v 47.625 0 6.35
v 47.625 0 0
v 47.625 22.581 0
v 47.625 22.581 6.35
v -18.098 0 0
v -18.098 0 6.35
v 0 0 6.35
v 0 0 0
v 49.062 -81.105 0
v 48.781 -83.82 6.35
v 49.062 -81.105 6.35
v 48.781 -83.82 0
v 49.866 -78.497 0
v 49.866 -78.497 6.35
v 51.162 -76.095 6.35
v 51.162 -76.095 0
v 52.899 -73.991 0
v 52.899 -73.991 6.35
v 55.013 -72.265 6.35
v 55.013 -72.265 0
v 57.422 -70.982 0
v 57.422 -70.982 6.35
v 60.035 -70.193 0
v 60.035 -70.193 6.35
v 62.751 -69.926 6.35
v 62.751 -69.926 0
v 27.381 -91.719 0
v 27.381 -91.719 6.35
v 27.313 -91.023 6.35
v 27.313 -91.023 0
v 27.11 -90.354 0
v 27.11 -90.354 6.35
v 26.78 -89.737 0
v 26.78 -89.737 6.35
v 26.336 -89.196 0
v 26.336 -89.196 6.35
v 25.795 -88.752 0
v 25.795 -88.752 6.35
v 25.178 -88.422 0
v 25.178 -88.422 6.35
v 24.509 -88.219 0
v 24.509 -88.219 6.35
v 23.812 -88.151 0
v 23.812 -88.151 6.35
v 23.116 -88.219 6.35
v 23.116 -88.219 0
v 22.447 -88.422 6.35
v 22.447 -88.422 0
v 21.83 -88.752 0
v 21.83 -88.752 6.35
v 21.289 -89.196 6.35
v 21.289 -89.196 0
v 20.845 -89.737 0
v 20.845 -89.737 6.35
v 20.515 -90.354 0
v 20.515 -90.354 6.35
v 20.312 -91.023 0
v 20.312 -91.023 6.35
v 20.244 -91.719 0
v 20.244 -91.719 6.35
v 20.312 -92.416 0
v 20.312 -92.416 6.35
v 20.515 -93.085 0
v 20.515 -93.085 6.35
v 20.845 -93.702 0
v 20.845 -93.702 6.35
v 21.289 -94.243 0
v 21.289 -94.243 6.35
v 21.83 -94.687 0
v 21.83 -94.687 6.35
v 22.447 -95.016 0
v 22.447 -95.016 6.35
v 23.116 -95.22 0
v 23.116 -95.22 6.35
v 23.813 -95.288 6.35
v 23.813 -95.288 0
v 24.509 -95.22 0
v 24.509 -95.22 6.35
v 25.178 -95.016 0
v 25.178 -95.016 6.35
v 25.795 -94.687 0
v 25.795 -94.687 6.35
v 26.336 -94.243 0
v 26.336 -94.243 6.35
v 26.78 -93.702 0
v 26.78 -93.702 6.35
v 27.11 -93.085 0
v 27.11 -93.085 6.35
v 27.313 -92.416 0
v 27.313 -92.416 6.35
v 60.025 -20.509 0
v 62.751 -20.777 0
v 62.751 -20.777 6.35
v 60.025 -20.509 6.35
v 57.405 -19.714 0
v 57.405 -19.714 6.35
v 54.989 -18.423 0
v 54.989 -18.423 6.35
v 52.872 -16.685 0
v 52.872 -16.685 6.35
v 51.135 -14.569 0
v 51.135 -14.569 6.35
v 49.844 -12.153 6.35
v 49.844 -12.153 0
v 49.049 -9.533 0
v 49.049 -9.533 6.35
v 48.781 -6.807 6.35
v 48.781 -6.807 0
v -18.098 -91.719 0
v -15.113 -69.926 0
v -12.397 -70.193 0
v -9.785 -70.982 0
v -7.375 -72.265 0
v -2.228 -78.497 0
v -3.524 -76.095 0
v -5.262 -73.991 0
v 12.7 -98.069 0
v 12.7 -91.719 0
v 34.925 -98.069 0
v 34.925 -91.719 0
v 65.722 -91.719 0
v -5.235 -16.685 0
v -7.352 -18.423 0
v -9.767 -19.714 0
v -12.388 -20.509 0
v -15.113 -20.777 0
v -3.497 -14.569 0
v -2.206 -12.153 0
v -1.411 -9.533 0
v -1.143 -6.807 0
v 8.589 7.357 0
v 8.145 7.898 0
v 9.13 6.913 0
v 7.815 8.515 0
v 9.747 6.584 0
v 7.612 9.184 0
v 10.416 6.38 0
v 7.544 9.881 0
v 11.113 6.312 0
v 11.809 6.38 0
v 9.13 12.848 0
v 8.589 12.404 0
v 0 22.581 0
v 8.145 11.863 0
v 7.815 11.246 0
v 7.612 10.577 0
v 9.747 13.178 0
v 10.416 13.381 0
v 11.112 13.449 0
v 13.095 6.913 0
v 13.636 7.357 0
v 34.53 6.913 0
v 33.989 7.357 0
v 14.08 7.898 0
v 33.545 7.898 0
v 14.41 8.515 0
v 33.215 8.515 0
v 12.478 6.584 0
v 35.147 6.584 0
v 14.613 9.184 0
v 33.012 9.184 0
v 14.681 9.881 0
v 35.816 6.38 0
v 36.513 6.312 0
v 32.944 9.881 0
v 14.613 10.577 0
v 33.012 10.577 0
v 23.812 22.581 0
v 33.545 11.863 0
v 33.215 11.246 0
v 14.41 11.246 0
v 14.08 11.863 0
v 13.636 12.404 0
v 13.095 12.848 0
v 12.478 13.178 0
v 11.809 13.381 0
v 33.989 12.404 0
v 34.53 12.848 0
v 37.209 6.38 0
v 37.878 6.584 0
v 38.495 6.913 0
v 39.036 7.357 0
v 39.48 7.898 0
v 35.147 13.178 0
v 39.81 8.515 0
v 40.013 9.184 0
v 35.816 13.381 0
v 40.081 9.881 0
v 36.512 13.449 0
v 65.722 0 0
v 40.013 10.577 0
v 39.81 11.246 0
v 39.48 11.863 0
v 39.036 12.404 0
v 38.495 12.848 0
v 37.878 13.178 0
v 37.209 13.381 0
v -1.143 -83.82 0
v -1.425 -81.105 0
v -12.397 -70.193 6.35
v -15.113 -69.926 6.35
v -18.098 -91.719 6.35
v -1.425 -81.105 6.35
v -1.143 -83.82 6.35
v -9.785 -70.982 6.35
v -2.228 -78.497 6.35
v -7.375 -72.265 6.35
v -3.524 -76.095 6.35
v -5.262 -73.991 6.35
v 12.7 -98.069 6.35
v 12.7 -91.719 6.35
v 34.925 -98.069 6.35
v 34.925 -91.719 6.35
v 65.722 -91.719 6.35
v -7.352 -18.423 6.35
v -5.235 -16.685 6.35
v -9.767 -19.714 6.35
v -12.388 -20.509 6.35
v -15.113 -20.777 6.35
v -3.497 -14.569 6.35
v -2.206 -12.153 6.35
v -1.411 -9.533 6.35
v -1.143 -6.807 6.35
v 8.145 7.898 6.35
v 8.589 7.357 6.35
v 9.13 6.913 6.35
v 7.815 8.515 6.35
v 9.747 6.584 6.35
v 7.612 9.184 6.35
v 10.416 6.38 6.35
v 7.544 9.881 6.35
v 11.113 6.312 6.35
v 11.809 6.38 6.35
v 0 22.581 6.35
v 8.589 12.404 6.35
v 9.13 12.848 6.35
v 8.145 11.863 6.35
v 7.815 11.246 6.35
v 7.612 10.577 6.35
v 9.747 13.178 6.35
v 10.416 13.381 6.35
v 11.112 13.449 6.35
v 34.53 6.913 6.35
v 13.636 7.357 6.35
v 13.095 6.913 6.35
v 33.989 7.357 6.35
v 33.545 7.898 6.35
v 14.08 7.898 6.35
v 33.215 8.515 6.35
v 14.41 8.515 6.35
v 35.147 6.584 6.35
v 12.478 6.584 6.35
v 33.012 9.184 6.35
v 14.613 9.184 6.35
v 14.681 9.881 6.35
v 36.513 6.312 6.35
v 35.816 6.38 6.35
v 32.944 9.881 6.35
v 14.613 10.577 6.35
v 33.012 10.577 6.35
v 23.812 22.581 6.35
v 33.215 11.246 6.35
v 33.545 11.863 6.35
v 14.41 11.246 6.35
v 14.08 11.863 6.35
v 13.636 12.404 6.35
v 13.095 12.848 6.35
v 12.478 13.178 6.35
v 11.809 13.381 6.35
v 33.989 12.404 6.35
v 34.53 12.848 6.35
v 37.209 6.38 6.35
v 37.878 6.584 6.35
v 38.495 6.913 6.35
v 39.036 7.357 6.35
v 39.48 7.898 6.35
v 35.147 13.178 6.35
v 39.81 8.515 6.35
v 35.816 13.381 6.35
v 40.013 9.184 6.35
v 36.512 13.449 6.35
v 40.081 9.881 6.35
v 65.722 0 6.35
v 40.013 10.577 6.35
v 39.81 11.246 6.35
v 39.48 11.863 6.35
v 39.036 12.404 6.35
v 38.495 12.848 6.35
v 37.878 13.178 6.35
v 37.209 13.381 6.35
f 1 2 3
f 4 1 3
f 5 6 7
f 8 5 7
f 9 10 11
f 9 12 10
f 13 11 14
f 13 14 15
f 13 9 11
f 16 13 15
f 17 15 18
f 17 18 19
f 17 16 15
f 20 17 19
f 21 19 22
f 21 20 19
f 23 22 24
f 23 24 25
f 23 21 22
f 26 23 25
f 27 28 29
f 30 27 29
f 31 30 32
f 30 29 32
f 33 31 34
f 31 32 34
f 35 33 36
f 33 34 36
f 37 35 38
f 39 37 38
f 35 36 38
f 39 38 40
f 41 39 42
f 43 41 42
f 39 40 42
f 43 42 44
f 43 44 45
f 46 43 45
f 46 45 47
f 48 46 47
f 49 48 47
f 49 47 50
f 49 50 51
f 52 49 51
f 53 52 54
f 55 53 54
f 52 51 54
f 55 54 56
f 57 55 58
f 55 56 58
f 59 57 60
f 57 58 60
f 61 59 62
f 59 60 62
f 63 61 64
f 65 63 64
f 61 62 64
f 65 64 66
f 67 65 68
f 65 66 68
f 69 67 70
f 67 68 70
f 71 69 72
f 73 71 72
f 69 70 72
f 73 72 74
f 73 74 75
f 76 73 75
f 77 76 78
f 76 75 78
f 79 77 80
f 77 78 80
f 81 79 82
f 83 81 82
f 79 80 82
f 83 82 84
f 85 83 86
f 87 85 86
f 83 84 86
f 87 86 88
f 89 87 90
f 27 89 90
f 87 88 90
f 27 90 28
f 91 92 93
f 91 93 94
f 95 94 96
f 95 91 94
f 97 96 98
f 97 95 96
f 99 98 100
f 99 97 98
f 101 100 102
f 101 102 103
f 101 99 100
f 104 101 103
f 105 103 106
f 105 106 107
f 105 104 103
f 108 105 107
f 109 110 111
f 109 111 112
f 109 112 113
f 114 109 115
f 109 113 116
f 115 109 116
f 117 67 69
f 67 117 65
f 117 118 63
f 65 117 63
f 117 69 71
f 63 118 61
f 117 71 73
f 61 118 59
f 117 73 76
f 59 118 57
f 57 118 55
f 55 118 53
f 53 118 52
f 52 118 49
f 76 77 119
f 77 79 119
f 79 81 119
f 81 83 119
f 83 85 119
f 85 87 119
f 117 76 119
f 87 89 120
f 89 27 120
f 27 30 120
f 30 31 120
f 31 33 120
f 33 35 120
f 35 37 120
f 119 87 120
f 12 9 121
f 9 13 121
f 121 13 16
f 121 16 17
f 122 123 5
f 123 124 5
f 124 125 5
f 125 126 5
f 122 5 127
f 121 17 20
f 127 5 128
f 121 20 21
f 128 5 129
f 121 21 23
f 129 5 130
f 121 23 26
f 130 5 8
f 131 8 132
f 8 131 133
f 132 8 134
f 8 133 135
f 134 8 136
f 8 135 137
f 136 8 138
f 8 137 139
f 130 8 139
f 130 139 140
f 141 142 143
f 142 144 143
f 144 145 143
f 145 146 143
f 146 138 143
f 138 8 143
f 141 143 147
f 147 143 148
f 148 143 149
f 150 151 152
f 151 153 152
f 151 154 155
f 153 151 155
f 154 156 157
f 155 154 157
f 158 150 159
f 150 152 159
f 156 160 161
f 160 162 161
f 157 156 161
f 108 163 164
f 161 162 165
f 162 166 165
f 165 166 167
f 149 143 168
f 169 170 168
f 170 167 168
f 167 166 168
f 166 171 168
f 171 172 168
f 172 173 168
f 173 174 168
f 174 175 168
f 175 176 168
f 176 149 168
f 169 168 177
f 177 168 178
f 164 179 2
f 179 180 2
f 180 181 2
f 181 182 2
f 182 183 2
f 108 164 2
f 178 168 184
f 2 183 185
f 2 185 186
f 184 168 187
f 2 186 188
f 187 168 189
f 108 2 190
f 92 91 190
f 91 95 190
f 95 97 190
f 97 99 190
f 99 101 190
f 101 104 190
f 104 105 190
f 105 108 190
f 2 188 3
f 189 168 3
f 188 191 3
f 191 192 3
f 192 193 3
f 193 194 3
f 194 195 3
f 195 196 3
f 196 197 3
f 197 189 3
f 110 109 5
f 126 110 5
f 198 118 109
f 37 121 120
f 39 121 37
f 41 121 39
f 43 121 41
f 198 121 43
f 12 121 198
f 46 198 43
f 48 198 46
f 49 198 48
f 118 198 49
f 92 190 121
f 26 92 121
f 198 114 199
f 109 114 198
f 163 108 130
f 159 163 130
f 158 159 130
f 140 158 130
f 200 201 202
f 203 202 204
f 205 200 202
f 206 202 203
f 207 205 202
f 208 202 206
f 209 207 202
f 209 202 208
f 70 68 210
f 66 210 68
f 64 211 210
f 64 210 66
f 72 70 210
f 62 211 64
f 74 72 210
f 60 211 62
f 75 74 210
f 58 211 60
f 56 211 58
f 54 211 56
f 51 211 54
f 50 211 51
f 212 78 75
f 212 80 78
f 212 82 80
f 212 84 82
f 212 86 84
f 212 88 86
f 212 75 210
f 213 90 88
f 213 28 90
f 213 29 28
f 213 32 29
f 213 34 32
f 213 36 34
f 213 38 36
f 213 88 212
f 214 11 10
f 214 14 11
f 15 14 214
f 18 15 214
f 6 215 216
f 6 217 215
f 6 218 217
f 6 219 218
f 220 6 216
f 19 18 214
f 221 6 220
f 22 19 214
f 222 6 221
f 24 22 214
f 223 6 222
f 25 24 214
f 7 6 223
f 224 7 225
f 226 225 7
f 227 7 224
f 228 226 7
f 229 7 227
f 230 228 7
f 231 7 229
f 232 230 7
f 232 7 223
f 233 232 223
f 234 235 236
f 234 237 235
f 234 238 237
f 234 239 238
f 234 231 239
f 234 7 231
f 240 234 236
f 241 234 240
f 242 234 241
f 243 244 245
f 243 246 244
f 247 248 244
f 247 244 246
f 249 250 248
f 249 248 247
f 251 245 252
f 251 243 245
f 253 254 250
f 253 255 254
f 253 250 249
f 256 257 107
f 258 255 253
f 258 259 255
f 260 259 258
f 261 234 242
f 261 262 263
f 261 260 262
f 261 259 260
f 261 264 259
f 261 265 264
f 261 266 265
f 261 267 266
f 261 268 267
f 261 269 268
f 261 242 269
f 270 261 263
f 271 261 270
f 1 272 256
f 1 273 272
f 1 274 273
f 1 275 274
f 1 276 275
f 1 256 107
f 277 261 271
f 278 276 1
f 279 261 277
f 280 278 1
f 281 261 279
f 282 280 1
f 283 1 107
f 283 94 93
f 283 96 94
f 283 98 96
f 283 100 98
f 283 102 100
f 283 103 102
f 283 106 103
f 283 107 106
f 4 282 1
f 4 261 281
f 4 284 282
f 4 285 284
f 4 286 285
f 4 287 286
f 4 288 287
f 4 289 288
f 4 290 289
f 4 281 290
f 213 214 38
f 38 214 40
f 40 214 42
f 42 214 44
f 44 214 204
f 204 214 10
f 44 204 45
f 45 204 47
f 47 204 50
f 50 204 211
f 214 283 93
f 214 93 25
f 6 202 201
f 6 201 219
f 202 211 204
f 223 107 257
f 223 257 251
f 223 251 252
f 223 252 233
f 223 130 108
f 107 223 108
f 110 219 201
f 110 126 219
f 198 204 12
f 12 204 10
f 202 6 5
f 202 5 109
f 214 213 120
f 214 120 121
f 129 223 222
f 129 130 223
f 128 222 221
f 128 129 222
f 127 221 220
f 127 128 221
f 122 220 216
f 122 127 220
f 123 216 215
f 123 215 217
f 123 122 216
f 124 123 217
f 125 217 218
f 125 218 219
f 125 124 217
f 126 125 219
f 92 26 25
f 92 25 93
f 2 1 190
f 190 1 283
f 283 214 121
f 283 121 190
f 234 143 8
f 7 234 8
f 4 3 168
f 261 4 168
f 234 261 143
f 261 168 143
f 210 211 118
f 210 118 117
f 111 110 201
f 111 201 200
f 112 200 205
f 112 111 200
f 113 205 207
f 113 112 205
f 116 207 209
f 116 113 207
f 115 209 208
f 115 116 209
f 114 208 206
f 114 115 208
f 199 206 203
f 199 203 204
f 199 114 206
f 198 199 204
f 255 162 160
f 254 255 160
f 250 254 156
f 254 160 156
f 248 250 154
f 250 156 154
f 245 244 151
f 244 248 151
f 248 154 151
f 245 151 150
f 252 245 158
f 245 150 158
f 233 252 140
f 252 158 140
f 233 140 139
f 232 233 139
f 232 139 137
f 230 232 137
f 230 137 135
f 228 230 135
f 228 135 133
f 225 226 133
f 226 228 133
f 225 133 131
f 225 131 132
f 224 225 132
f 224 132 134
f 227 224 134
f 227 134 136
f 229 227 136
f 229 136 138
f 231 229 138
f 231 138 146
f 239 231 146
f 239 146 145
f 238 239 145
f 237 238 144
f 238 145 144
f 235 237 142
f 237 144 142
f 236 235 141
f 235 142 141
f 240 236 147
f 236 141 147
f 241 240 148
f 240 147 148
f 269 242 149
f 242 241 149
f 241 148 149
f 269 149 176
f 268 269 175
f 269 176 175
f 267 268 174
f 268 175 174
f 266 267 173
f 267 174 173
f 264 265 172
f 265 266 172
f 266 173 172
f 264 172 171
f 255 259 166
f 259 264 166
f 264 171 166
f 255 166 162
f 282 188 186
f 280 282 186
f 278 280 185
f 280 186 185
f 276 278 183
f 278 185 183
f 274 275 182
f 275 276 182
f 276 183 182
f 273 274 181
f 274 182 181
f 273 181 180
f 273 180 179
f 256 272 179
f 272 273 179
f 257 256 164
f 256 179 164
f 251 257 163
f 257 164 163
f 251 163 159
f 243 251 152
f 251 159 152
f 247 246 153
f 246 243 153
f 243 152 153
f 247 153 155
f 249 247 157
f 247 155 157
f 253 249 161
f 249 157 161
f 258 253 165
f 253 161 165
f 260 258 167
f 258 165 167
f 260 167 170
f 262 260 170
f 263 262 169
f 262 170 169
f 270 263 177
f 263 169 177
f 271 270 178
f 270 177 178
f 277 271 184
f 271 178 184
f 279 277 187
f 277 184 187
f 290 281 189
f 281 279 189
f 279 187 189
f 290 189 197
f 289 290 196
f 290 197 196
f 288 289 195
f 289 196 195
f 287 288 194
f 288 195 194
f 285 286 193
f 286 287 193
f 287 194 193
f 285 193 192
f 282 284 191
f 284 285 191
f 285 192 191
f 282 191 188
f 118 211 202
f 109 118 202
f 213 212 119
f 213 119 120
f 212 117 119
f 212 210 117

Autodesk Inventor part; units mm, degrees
ref_plane "YZ Plane" through (0, 0, 0) normal (1, 0, 0) x (0, 1, 0)
ref_plane "XZ Plane" through (0, 0, 0) normal (0, 1, 0) x (-1, 0, 0)
ref_plane "XY Plane" through (0, 0, 0) normal (0, 0, 1) x (1, 0, 0)
sketch "Sketch1" plane through (0, 0, 0) normal (0, 0, 1) x (1, 0, 0)
  line L0 (0, 0) -> (47.625, 0)
  line L1 (47.625, 0) -> (47.625, 22.5806)
  line L2 (47.625, 22.5806) -> (0, 22.5806)
  line L3 (0, 22.5806) -> (0, 0)
  line L4 (23.8125, 22.5806) -> (23.8125, 9.8806)
  line L5 (23.8125, 9.8806) -> (36.5125, 9.8806)
  line L6 (23.8125, 9.8806) -> (11.1125, 9.8806)
  circle A0 centre (11.1125, 9.8806) radius 3.5687
  circle A1 centre (36.5125, 9.8806) radius 3.5687
  dimension "d1" = 47.625
  dimension "d3" = 12.7
  dimension "d4" = 12.7
  dimension "d5" = 12.7
  dimension "d6" = 7.1374
  dimension "d7" = 7.1374
  dimension "d10" = 22.5806
extrude "Extrusion1" add sketch "Sketch1" along normal blind 6.35
sketch "Sketch3" plane through (0, 0, 6.35) normal (0, 0, 1) x (1, 0, 0)
  line L0 (0, 0) -> (47.625, 0) projected
  line L1 (23.8125, 0) -> (65.7225, 0)
  line L2 (23.8125, 0) -> (23.8125, -41.91)
  circle A0 centre (23.8125, -41.91) radius 33.02
  line L3 (65.7225, 0) -> (-18.0975, 0)
  line L4 (-18.0975, 0) -> (-18.0975, -83.82)
  line L5 (-18.0975, -83.82) -> (65.7225, -83.82)
  line L6 (65.7225, -83.82) -> (65.7225, 0)
  circle A1 centre (11.1125, 9.8806) radius 3.5687 projected
  line L7 (23.8125, 9.8806) -> (23.8125, -91.7194)
  line L8 (23.8125, 9.8806) -> (125.4125, 9.8806) construction
  line L9 (11.1125, 9.8806) -> (23.8125, 9.8806)
  circle A2 centre (23.8125, -91.7194) radius 3.5687
  line L10 (12.7, -98.0694) -> (34.925, -98.0694)
  line L11 (34.925, -98.0694) -> (34.925, -85.3694)
  line L12 (34.925, -85.3694) -> (12.7, -85.3694)
  line L13 (12.7, -85.3694) -> (12.7, -98.0694)
  line L14 (12.7, -98.0694) -> (34.925, -85.3694) construction
  line L15 (34.925, -98.0694) -> (12.7, -85.3694) construction
  point P0 (12.7, -83.82)
  point P1 (34.925, -83.82)
  dimension "d11" = 41.91
  dimension "d12" = 41.91
  dimension "d13" = 66.04
  dimension "d14" = 83.82
  dimension "d15" = 83.82
  dimension "d19" = 90
  dimension "d20" = 7.1374
  dimension "d22" = 22.225
  dimension "d23" = 12.7
  dimension "d39" = 101.6
extrude "Extrusion2" add sketch "Sketch3" against normal blind 6.35 contours L12 L11 L10 L13 | L0 L2 A0 L7 L5 L4 L3 | L0 L1 L6 L5 L7 A0 L2
sketch "Sketch4" plane through (0, 0, 0) normal (0, 0, -1) x (-1, 0, 0)
  line L0 (-47.625, 22.5806) -> (0, 22.5806) projected
  line L1 (-23.8125, 22.5806) -> (-23.8125, 0)
  line L2 (-23.8125, 0) -> (-23.8125, -6.8072)
  line L3 (-23.8125, -6.8072) -> (1.143, -6.8072)
  line L4 (-23.8125, -6.8072) -> (-48.7807, -6.8072)
  line L5 (-48.7807, -6.8072) -> (-62.7507, -6.8072)
  line L6 (1.143, -6.8072) -> (15.113, -6.8072)
  line L7 (-62.7507, -6.8072) -> (-62.7507, -20.7772)
  arc A0 (-62.7507, -20.7772) -> (-48.7807, -6.8072) centre (-62.7507, -6.8072) ccw
  line L8 (-62.7507, -20.7772) -> (-62.7507, -45.3517)
  line L9 (-62.7507, -45.3517) -> (8.128, -45.3517)
  line L10 (15.113, -6.8072) -> (15.113, -20.7772)
  arc A1 (1.143, -6.8072) -> (15.113, -20.7772) centre (15.113, -6.8072) ccw
  line L11 (15.113, -20.7772) -> (15.113, -45.3644)
  line L12 (-23.8125, -83.8962) -> (1.143, -83.8962)
  line L13 (-23.8125, -83.8962) -> (-48.7807, -83.8962)
  arc A2 (-48.7807, -83.8962) -> (-62.7507, -69.9262) centre (-62.7507, -83.8962) ccw
  line L14 (-62.7507, -69.9262) -> (-62.7507, -45.3517)
  arc A3 (15.113, -69.9262) -> (1.143, -83.8962) centre (15.113, -83.8962) ccw
  line L15 (15.113, -69.9262) -> (15.113, -45.339)
  point P0 (0, 0)
  dimension "d26" = 6.8072
  dimension "d27" = 24.9555
  dimension "d28" = 24.9682
  dimension "d29" = 13.97
  dimension "d30" = 13.97
  dimension "d31" = 13.97
  dimension "d32" = 13.97
  dimension "d33" = 24.5745
  dimension "d34" = 13.97
  dimension "d35" = 13.97
  dimension "d36" = 24.5872
extrude "Extrusion3" cut sketch "Sketch4" against normal blind 6.35 contours L3 A1 L11 L15 A3 L12 L13 A2 L14 L8 A0 L4
sketch "Sketch5" plane through (0, 0, 6.35) normal (0, 0, 1) x (1, 0, 0)
  line L0 (12.7, -85.3694) -> (34.925, -85.3694) projected
  line L1 (23.8125, -85.3694) -> (23.8125, -91.7194)
  circle A0 centre (23.8125, -91.7194) radius 3.5687
  point P0 (0, 0)
  dimension "d40" = 6.35
  dimension "d41" = 7.1374
extrude "Extrusion4" cut sketch "Sketch5" against normal blind 7.1374
sketch "Sketch6" plane through (0, 0, 6.35) normal (0, 0, 1) x (1, 0, 0)
  line L0 (-18.0975, -83.82) -> (-1.1432, -83.82) projected
  line L1 (65.7225, -83.82) -> (48.7809, -83.82) projected
  line L2 (-1.1432, -83.82) -> (48.7809, -83.82)
  line L3 (12.7, -85.3694) -> (34.925, -85.3694) projected
  line L4 (34.925, -85.3694) -> (34.925, -83.82)
  line L5 (12.7, -85.3694) -> (12.7, -83.82)
  line L6 (34.925, -85.3694) -> (68.0228, -85.3694)
  line L7 (-18.0975, -85.3694) -> (12.7, -85.3694)
  line L8 (-18.0975, -83.82) -> (-18.0975, -85.3694)
  line L9 (12.7, -98.0694) -> (12.7, -85.3694) projected
  line L10 (12.7, -85.3694) -> (12.7, -91.7194)
  line L11 (-18.0975, -91.7194) -> (-18.0975, -85.3694)
  line L12 (34.925, -91.7194) -> (68.0228, -91.7194)
  line L13 (65.7225, -83.82) -> (65.7225, -91.7194)
  line L14 (12.7, -91.7194) -> (-12.7, -91.7194)
  line L15 (-12.7, -91.7194) -> (-18.0975, -91.7194)
  line L16 (34.925, -85.3694) -> (34.925, -98.0694) projected
  line L17 (34.925, -91.7194) -> (34.925, -85.3694)
  point P0 (0, 0)
  point P1 (65.7225, -85.3694)
  dimension "d44" = 6.35
  dimension "d45" = 25.4
extrude "Extrusion5" add sketch "Sketch6" against normal blind 6.35
properties part number "Clamp connector 2"
